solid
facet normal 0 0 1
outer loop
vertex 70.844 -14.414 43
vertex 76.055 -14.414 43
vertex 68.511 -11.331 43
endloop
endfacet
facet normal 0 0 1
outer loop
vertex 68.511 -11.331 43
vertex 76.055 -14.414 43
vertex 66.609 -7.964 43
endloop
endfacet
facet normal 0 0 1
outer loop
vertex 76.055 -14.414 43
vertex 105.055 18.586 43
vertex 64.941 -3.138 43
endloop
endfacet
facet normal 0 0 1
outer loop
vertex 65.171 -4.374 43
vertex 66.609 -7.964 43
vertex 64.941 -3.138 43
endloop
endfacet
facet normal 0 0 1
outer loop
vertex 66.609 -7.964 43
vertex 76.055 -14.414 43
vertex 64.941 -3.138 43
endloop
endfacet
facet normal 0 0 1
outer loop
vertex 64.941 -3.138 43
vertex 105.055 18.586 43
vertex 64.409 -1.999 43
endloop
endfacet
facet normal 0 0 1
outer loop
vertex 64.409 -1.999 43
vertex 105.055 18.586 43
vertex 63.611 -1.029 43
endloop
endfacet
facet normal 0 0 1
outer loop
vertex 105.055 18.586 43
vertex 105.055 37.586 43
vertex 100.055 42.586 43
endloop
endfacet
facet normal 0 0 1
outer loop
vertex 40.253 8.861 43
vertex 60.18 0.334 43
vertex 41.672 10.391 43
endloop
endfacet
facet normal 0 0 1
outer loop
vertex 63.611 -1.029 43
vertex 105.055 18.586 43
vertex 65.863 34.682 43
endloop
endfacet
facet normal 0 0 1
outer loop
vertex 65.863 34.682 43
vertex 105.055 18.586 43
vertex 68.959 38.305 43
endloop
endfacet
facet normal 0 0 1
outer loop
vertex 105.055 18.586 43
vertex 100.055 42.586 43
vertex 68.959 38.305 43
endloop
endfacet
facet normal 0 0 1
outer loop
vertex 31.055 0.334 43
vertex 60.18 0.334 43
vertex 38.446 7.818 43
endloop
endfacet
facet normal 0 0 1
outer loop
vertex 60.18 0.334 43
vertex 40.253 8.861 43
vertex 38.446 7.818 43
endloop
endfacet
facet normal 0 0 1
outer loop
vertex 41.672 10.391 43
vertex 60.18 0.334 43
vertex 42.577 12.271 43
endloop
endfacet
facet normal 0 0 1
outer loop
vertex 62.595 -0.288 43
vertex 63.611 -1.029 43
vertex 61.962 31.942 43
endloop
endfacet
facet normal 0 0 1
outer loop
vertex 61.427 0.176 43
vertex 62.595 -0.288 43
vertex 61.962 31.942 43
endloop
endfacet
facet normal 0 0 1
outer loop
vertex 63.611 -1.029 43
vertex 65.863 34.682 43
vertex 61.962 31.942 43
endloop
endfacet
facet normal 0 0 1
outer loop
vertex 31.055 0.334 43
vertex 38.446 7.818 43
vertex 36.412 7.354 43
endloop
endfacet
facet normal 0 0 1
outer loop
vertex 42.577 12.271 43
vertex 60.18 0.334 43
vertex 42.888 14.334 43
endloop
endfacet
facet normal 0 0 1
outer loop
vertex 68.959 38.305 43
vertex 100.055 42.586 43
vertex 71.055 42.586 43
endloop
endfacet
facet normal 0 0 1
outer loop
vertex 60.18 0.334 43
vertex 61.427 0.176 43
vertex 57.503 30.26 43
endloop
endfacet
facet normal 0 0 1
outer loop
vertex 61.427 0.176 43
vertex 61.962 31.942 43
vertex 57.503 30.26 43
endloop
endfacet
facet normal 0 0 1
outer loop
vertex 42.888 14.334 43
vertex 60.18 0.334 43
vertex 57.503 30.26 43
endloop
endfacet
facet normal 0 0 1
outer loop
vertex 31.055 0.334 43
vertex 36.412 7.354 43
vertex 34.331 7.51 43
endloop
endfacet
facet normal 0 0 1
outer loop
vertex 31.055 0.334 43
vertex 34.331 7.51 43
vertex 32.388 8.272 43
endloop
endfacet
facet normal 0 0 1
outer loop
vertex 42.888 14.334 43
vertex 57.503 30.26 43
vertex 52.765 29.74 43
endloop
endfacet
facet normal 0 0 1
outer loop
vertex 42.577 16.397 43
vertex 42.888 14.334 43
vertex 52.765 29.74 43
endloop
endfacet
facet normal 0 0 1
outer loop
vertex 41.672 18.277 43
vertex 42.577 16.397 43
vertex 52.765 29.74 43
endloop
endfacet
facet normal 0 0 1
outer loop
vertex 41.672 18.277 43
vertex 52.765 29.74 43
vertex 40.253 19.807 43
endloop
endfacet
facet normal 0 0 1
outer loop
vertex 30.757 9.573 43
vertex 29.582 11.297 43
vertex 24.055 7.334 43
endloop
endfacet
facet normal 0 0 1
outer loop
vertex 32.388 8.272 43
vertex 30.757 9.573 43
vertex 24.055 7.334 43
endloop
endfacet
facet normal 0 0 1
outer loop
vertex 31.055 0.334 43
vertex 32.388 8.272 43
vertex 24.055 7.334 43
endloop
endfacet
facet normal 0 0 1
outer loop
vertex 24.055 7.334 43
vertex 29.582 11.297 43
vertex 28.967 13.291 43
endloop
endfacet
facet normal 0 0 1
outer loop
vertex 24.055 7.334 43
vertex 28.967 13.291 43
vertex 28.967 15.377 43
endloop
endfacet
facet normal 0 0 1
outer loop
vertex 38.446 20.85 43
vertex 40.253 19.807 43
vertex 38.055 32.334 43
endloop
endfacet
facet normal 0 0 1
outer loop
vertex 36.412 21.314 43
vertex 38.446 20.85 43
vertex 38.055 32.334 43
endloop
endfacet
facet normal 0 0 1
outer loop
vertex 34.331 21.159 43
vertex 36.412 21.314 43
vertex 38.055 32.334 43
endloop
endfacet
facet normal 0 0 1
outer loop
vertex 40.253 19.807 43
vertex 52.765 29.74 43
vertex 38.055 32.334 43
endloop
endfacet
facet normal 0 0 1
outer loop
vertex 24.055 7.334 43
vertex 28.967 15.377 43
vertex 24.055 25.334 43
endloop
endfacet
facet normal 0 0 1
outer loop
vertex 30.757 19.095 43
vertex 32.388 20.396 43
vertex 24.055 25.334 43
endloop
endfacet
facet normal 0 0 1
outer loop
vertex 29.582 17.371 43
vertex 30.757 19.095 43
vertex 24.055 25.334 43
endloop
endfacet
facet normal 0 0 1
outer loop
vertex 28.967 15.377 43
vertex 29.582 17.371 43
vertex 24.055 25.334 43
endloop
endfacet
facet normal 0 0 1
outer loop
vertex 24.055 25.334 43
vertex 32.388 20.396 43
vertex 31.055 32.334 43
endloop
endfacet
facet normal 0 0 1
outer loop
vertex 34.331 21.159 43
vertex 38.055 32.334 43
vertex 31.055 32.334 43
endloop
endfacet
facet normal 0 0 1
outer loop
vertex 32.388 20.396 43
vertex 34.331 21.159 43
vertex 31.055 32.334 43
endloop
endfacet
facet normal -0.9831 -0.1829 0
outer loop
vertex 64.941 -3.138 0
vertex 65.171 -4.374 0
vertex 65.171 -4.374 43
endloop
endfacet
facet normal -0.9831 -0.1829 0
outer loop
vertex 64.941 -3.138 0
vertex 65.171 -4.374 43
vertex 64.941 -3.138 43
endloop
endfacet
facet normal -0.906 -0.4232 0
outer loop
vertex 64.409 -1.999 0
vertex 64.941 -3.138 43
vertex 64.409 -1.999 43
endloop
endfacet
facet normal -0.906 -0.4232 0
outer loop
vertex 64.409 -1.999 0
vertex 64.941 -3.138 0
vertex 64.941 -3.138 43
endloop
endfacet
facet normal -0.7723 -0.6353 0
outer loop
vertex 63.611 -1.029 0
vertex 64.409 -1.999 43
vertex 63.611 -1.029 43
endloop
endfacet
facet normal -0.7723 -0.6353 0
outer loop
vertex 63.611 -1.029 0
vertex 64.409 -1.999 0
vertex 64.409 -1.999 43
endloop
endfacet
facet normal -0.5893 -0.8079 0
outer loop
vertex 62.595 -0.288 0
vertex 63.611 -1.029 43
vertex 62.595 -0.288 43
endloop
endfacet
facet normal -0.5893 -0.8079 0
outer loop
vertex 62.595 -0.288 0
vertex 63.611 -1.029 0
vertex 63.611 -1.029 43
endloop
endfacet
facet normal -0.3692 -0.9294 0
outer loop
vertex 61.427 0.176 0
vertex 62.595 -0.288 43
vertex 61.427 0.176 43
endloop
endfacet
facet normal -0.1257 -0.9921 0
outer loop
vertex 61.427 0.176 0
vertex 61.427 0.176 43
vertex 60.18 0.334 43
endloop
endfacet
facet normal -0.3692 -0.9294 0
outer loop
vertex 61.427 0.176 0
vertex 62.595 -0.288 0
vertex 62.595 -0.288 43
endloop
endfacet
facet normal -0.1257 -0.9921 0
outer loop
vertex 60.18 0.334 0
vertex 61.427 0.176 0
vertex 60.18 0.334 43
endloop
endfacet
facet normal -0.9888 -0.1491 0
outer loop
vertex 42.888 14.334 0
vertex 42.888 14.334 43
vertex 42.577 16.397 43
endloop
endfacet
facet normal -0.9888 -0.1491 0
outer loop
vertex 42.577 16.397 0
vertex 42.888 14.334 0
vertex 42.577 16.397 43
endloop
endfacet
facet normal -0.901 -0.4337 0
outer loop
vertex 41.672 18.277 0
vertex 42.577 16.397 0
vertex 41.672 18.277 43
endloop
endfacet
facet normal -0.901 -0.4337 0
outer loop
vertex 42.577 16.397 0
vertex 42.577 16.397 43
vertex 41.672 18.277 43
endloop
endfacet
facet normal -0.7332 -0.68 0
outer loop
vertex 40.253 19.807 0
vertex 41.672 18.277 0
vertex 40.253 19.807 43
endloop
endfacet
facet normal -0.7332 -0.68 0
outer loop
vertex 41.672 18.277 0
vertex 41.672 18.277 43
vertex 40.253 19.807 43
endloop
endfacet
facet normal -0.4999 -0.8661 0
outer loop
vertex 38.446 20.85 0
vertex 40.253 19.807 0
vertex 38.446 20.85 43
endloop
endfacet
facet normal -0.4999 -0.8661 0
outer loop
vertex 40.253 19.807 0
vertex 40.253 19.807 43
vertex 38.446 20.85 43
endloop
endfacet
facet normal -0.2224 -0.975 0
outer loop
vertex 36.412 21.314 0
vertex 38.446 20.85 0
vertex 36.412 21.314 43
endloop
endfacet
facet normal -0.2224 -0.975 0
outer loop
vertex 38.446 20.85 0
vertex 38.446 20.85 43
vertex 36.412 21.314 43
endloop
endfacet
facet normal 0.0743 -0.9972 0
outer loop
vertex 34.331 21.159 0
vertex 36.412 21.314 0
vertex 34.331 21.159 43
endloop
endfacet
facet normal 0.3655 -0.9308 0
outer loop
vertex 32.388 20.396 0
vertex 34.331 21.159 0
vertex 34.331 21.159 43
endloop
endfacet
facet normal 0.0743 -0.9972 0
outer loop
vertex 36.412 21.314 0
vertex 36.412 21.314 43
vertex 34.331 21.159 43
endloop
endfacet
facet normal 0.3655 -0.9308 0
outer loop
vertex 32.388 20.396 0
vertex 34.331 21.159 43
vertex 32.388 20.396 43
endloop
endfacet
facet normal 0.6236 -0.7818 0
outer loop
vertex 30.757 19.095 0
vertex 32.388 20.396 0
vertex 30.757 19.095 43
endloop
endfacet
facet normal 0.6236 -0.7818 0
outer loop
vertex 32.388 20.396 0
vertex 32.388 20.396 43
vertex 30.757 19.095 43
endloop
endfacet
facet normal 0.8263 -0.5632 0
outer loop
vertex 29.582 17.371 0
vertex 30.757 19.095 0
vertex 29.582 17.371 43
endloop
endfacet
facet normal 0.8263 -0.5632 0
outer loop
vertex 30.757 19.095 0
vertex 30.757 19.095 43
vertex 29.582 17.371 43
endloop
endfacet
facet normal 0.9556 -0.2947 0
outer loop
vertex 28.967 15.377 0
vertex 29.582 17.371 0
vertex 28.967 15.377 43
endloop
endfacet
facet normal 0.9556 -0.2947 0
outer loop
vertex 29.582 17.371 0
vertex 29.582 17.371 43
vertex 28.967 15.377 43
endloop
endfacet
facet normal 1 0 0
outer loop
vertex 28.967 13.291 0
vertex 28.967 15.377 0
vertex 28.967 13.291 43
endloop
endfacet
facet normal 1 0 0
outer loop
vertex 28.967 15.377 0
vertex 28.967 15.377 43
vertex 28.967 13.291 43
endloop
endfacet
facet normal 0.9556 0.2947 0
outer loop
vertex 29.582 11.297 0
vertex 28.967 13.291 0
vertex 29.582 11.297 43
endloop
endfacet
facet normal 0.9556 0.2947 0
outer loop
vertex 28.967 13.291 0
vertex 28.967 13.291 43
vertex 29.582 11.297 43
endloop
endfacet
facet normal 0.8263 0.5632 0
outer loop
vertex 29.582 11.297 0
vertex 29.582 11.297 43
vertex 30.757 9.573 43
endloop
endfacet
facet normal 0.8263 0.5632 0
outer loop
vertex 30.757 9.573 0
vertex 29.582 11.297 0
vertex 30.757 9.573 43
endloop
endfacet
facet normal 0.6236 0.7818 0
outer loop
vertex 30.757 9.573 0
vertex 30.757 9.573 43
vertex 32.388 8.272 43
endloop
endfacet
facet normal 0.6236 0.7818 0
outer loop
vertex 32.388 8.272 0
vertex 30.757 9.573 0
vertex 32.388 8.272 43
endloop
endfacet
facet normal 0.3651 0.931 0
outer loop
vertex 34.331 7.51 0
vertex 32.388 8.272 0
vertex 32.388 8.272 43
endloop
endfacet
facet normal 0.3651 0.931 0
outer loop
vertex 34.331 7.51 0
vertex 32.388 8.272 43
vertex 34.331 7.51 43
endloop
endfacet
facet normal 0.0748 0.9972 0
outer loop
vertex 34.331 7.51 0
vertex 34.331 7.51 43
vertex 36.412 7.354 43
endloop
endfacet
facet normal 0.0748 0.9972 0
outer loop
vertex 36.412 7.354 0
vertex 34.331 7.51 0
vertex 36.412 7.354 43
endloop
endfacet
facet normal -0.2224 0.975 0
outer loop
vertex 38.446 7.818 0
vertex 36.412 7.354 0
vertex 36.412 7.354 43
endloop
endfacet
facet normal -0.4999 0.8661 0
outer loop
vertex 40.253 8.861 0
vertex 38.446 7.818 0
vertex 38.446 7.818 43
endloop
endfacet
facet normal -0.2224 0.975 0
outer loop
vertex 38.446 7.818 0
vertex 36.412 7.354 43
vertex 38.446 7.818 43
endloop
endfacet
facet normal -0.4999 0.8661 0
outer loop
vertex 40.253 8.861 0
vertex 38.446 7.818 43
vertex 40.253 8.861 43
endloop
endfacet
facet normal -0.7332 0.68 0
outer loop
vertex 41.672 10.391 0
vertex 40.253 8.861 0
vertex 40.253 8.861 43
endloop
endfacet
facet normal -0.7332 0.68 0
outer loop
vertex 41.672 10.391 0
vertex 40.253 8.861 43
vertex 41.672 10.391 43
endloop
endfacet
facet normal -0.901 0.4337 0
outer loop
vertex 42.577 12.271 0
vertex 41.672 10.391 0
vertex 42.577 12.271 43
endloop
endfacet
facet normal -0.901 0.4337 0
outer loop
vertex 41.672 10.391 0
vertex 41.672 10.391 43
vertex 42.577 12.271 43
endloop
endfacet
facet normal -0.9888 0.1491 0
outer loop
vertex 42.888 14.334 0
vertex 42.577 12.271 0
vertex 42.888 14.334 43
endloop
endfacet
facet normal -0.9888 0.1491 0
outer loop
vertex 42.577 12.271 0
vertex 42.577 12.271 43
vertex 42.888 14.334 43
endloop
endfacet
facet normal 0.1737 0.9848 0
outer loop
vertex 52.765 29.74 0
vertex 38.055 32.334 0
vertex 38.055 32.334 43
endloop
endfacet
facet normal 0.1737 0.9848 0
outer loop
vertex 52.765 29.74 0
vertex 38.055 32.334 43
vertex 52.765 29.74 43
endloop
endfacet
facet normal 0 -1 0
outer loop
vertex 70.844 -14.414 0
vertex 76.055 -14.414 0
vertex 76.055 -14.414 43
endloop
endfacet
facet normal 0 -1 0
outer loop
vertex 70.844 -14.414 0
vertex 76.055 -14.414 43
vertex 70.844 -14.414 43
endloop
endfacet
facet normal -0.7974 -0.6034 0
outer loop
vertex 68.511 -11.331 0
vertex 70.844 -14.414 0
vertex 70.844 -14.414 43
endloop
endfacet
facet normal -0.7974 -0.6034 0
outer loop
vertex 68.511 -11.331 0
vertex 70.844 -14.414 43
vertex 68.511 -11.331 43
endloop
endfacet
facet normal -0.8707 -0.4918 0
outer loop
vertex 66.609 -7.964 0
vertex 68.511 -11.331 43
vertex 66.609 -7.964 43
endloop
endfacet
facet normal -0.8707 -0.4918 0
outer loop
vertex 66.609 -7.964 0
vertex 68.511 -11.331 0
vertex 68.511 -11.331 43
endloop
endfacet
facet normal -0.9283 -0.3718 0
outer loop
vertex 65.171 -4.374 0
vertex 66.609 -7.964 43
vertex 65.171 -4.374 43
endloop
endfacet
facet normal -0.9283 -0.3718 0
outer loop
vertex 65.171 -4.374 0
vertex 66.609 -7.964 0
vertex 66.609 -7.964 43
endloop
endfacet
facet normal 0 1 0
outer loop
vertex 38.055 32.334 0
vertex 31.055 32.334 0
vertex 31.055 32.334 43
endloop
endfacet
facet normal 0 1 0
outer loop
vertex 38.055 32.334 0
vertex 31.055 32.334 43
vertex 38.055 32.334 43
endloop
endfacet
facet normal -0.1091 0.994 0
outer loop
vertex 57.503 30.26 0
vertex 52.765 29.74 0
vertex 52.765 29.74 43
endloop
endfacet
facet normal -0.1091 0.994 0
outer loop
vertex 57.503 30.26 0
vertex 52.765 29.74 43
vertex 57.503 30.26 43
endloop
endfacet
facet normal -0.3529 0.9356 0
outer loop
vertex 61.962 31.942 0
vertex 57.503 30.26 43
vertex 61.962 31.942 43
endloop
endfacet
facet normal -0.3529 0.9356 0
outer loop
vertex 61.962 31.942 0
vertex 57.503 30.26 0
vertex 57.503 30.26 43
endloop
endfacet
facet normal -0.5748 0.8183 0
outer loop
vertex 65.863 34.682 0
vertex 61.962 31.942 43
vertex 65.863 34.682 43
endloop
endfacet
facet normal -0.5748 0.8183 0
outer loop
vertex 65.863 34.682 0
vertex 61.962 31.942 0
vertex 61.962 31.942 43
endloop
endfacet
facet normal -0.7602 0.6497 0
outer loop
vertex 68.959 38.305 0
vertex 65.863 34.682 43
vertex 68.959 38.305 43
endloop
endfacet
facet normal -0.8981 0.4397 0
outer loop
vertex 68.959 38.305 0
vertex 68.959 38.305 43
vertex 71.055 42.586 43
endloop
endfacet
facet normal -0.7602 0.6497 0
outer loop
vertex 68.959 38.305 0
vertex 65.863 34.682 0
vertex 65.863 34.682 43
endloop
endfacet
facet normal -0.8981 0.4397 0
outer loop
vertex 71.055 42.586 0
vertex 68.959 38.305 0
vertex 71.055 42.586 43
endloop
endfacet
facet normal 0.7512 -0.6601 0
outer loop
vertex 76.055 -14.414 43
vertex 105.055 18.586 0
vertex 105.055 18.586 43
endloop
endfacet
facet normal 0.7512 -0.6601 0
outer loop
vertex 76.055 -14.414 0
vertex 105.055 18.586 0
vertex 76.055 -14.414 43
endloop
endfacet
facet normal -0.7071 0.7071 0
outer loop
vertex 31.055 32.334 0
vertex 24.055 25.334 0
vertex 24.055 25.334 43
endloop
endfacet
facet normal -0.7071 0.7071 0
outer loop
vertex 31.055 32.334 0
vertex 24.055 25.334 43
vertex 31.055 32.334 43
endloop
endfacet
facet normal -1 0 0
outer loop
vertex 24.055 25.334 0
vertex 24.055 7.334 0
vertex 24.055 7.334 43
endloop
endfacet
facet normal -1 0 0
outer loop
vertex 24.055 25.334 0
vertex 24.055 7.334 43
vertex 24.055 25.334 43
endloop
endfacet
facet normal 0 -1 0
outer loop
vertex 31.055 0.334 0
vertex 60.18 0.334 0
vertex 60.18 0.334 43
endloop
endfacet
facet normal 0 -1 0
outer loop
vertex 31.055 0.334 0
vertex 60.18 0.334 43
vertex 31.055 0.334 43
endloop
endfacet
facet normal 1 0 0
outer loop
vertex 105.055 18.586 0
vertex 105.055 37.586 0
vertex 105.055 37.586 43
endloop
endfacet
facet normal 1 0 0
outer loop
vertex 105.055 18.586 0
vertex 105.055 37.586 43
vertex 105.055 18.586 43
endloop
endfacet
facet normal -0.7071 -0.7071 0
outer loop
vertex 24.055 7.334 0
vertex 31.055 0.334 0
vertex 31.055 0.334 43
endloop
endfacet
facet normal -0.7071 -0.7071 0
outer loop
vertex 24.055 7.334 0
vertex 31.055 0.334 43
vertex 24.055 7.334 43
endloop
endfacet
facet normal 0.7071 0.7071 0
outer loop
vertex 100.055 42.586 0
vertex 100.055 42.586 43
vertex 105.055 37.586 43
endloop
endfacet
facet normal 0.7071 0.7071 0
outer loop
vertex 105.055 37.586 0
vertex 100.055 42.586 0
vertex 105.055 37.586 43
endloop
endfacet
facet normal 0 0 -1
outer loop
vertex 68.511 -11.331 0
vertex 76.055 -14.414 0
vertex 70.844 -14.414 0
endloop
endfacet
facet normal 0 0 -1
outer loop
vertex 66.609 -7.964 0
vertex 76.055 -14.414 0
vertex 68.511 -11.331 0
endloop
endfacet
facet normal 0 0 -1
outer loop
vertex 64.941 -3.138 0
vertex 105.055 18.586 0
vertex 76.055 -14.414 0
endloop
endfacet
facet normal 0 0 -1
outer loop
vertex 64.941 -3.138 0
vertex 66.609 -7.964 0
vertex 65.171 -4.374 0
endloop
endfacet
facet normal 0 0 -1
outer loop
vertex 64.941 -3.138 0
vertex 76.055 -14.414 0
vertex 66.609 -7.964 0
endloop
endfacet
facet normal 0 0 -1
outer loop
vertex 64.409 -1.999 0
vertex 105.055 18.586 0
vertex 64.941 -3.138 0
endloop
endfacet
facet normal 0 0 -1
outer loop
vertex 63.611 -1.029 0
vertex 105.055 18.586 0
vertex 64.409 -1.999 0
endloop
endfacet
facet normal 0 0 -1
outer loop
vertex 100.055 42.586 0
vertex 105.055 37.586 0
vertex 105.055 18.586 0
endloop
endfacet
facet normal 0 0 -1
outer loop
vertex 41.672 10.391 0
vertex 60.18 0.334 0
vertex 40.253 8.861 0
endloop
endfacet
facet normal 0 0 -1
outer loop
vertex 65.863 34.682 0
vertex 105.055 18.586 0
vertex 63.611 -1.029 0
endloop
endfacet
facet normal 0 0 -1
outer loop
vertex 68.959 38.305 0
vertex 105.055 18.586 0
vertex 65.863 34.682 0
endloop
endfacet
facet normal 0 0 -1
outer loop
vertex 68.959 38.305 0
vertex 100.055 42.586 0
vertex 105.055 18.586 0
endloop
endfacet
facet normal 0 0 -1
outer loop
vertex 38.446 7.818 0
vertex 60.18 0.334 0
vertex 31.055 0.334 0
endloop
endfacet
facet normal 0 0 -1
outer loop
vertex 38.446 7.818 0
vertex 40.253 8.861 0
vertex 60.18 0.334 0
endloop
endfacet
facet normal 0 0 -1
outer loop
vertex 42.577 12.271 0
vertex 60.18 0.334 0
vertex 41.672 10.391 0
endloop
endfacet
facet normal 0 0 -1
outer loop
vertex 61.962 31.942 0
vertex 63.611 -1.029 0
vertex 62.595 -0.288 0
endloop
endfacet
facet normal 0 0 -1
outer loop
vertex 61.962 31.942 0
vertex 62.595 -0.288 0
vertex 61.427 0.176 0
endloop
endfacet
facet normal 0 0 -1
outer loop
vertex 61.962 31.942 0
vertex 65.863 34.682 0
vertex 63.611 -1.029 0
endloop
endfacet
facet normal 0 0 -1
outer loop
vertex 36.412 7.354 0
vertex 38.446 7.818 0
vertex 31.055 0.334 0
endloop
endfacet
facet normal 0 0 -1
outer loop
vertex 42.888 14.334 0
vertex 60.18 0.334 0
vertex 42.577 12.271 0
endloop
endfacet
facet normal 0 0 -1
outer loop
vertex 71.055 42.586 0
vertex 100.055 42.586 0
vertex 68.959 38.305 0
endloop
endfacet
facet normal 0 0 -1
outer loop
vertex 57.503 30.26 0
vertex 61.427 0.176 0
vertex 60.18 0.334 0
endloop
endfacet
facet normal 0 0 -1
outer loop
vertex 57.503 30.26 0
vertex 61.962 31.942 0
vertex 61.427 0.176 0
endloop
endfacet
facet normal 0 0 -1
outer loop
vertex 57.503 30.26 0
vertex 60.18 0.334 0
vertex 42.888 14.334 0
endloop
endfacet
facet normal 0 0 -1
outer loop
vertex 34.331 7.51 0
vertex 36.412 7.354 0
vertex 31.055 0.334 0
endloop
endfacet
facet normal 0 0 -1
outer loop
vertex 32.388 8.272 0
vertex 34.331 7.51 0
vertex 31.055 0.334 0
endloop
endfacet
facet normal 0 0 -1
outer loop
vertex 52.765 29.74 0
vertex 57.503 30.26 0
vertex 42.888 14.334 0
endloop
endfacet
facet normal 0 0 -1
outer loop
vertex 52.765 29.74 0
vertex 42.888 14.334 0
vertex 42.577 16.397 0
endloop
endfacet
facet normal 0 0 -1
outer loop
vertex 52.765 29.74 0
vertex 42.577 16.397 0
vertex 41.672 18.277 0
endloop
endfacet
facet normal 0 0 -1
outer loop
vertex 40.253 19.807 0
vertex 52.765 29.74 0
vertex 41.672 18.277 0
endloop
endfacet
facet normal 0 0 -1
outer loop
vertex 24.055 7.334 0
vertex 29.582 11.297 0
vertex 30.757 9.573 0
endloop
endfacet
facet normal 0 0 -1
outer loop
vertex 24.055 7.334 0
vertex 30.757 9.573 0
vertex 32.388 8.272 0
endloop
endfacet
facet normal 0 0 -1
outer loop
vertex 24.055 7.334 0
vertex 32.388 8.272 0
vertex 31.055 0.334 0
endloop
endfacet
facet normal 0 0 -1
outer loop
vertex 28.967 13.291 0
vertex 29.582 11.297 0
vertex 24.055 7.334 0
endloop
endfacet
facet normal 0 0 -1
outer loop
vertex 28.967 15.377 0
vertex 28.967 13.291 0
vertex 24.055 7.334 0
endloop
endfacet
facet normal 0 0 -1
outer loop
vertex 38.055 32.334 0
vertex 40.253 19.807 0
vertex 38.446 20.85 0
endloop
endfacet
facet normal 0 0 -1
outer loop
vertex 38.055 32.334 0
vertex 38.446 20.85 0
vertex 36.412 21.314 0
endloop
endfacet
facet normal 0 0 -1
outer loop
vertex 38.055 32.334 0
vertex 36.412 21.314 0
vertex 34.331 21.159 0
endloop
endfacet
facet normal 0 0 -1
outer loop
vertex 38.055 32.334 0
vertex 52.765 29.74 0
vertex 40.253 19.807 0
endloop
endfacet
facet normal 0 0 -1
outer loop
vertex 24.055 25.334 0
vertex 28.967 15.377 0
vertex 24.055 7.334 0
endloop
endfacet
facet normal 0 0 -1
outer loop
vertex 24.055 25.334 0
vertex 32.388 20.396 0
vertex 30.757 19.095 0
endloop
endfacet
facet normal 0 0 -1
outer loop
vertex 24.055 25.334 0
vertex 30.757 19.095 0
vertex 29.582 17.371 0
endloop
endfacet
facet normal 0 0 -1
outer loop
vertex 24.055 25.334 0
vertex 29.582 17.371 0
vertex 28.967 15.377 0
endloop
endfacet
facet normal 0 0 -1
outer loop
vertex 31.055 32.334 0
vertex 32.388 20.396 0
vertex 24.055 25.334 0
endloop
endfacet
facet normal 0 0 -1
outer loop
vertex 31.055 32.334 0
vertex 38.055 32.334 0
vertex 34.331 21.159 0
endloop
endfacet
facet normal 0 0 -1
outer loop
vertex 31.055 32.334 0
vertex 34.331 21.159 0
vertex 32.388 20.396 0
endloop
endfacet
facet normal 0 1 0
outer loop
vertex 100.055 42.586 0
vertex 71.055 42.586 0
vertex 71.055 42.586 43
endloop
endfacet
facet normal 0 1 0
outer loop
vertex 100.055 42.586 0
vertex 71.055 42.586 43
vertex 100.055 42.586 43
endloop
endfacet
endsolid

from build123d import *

# Parameters (mm, degrees)
BOSS_EXTRU_1_DEPTH      = 43
ESQUISSE2_R             = 7
ENL_V_MAT_EXTRU_1_DEPTH = 43


with BuildPart() as part:
    # Esquisse1 → Boss.-Extru.1 (new body)
    with BuildSketch(Plane.XY):
        with BuildLine():
            Line((71.055498862, 42.585779817), (100.055498862, 42.585779817))
            Line((100.055498862, 42.585779817), (105.055498862, 37.585779817))
            Line((105.055498862, 37.585779817), (105.055498862, 18.585779817))
            Line((105.055498862, 18.585779817), (76.055498862, -14.414220183))
            Line((76.055498862, -14.414220183), (70.843566259, -14.414220183))
            ThreePointArc((70.843566259, -14.414220183), (67.503369178, -9.678966252), (65.171321088, -4.374147872))
            ThreePointArc((65.171321088, -4.374147872), (63.610652231, -1.028725087), (60.179844427, 0.334029003))
            Line((60.179844427, 0.334029003), (31.055498862, 0.334029003))
            Line((31.055498862, 0.334029003), (24.055498862, 7.334029003))
            Line((24.055498862, 7.334029003), (24.055498862, 25.334029003))
            Line((24.055498862, 25.334029003), (31.055498862, 32.334029003))
            Line((31.055498862, 32.334029003), (38.055498862, 32.334029003))
            Line((38.055498862, 32.334029003), (52.765077496, 29.740333415))
            ThreePointArc((52.765077496, 29.740333415), (63.998851376, 33.189185585), (71.055498862, 42.585779817))
        make_face()
    extrude(amount=BOSS_EXTRU_1_DEPTH)

    # Esquisse2 → Enlèv. mat.-Extru.1 (cut)
    with BuildSketch(Plane.XY.offset(43)):
        with Locations((35.888461386, 14.334029003)):
            Circle(ESQUISSE2_R)
    extrude(amount=-ENL_V_MAT_EXTRU_1_DEPTH, mode=Mode.SUBTRACT)


solid = part.part
